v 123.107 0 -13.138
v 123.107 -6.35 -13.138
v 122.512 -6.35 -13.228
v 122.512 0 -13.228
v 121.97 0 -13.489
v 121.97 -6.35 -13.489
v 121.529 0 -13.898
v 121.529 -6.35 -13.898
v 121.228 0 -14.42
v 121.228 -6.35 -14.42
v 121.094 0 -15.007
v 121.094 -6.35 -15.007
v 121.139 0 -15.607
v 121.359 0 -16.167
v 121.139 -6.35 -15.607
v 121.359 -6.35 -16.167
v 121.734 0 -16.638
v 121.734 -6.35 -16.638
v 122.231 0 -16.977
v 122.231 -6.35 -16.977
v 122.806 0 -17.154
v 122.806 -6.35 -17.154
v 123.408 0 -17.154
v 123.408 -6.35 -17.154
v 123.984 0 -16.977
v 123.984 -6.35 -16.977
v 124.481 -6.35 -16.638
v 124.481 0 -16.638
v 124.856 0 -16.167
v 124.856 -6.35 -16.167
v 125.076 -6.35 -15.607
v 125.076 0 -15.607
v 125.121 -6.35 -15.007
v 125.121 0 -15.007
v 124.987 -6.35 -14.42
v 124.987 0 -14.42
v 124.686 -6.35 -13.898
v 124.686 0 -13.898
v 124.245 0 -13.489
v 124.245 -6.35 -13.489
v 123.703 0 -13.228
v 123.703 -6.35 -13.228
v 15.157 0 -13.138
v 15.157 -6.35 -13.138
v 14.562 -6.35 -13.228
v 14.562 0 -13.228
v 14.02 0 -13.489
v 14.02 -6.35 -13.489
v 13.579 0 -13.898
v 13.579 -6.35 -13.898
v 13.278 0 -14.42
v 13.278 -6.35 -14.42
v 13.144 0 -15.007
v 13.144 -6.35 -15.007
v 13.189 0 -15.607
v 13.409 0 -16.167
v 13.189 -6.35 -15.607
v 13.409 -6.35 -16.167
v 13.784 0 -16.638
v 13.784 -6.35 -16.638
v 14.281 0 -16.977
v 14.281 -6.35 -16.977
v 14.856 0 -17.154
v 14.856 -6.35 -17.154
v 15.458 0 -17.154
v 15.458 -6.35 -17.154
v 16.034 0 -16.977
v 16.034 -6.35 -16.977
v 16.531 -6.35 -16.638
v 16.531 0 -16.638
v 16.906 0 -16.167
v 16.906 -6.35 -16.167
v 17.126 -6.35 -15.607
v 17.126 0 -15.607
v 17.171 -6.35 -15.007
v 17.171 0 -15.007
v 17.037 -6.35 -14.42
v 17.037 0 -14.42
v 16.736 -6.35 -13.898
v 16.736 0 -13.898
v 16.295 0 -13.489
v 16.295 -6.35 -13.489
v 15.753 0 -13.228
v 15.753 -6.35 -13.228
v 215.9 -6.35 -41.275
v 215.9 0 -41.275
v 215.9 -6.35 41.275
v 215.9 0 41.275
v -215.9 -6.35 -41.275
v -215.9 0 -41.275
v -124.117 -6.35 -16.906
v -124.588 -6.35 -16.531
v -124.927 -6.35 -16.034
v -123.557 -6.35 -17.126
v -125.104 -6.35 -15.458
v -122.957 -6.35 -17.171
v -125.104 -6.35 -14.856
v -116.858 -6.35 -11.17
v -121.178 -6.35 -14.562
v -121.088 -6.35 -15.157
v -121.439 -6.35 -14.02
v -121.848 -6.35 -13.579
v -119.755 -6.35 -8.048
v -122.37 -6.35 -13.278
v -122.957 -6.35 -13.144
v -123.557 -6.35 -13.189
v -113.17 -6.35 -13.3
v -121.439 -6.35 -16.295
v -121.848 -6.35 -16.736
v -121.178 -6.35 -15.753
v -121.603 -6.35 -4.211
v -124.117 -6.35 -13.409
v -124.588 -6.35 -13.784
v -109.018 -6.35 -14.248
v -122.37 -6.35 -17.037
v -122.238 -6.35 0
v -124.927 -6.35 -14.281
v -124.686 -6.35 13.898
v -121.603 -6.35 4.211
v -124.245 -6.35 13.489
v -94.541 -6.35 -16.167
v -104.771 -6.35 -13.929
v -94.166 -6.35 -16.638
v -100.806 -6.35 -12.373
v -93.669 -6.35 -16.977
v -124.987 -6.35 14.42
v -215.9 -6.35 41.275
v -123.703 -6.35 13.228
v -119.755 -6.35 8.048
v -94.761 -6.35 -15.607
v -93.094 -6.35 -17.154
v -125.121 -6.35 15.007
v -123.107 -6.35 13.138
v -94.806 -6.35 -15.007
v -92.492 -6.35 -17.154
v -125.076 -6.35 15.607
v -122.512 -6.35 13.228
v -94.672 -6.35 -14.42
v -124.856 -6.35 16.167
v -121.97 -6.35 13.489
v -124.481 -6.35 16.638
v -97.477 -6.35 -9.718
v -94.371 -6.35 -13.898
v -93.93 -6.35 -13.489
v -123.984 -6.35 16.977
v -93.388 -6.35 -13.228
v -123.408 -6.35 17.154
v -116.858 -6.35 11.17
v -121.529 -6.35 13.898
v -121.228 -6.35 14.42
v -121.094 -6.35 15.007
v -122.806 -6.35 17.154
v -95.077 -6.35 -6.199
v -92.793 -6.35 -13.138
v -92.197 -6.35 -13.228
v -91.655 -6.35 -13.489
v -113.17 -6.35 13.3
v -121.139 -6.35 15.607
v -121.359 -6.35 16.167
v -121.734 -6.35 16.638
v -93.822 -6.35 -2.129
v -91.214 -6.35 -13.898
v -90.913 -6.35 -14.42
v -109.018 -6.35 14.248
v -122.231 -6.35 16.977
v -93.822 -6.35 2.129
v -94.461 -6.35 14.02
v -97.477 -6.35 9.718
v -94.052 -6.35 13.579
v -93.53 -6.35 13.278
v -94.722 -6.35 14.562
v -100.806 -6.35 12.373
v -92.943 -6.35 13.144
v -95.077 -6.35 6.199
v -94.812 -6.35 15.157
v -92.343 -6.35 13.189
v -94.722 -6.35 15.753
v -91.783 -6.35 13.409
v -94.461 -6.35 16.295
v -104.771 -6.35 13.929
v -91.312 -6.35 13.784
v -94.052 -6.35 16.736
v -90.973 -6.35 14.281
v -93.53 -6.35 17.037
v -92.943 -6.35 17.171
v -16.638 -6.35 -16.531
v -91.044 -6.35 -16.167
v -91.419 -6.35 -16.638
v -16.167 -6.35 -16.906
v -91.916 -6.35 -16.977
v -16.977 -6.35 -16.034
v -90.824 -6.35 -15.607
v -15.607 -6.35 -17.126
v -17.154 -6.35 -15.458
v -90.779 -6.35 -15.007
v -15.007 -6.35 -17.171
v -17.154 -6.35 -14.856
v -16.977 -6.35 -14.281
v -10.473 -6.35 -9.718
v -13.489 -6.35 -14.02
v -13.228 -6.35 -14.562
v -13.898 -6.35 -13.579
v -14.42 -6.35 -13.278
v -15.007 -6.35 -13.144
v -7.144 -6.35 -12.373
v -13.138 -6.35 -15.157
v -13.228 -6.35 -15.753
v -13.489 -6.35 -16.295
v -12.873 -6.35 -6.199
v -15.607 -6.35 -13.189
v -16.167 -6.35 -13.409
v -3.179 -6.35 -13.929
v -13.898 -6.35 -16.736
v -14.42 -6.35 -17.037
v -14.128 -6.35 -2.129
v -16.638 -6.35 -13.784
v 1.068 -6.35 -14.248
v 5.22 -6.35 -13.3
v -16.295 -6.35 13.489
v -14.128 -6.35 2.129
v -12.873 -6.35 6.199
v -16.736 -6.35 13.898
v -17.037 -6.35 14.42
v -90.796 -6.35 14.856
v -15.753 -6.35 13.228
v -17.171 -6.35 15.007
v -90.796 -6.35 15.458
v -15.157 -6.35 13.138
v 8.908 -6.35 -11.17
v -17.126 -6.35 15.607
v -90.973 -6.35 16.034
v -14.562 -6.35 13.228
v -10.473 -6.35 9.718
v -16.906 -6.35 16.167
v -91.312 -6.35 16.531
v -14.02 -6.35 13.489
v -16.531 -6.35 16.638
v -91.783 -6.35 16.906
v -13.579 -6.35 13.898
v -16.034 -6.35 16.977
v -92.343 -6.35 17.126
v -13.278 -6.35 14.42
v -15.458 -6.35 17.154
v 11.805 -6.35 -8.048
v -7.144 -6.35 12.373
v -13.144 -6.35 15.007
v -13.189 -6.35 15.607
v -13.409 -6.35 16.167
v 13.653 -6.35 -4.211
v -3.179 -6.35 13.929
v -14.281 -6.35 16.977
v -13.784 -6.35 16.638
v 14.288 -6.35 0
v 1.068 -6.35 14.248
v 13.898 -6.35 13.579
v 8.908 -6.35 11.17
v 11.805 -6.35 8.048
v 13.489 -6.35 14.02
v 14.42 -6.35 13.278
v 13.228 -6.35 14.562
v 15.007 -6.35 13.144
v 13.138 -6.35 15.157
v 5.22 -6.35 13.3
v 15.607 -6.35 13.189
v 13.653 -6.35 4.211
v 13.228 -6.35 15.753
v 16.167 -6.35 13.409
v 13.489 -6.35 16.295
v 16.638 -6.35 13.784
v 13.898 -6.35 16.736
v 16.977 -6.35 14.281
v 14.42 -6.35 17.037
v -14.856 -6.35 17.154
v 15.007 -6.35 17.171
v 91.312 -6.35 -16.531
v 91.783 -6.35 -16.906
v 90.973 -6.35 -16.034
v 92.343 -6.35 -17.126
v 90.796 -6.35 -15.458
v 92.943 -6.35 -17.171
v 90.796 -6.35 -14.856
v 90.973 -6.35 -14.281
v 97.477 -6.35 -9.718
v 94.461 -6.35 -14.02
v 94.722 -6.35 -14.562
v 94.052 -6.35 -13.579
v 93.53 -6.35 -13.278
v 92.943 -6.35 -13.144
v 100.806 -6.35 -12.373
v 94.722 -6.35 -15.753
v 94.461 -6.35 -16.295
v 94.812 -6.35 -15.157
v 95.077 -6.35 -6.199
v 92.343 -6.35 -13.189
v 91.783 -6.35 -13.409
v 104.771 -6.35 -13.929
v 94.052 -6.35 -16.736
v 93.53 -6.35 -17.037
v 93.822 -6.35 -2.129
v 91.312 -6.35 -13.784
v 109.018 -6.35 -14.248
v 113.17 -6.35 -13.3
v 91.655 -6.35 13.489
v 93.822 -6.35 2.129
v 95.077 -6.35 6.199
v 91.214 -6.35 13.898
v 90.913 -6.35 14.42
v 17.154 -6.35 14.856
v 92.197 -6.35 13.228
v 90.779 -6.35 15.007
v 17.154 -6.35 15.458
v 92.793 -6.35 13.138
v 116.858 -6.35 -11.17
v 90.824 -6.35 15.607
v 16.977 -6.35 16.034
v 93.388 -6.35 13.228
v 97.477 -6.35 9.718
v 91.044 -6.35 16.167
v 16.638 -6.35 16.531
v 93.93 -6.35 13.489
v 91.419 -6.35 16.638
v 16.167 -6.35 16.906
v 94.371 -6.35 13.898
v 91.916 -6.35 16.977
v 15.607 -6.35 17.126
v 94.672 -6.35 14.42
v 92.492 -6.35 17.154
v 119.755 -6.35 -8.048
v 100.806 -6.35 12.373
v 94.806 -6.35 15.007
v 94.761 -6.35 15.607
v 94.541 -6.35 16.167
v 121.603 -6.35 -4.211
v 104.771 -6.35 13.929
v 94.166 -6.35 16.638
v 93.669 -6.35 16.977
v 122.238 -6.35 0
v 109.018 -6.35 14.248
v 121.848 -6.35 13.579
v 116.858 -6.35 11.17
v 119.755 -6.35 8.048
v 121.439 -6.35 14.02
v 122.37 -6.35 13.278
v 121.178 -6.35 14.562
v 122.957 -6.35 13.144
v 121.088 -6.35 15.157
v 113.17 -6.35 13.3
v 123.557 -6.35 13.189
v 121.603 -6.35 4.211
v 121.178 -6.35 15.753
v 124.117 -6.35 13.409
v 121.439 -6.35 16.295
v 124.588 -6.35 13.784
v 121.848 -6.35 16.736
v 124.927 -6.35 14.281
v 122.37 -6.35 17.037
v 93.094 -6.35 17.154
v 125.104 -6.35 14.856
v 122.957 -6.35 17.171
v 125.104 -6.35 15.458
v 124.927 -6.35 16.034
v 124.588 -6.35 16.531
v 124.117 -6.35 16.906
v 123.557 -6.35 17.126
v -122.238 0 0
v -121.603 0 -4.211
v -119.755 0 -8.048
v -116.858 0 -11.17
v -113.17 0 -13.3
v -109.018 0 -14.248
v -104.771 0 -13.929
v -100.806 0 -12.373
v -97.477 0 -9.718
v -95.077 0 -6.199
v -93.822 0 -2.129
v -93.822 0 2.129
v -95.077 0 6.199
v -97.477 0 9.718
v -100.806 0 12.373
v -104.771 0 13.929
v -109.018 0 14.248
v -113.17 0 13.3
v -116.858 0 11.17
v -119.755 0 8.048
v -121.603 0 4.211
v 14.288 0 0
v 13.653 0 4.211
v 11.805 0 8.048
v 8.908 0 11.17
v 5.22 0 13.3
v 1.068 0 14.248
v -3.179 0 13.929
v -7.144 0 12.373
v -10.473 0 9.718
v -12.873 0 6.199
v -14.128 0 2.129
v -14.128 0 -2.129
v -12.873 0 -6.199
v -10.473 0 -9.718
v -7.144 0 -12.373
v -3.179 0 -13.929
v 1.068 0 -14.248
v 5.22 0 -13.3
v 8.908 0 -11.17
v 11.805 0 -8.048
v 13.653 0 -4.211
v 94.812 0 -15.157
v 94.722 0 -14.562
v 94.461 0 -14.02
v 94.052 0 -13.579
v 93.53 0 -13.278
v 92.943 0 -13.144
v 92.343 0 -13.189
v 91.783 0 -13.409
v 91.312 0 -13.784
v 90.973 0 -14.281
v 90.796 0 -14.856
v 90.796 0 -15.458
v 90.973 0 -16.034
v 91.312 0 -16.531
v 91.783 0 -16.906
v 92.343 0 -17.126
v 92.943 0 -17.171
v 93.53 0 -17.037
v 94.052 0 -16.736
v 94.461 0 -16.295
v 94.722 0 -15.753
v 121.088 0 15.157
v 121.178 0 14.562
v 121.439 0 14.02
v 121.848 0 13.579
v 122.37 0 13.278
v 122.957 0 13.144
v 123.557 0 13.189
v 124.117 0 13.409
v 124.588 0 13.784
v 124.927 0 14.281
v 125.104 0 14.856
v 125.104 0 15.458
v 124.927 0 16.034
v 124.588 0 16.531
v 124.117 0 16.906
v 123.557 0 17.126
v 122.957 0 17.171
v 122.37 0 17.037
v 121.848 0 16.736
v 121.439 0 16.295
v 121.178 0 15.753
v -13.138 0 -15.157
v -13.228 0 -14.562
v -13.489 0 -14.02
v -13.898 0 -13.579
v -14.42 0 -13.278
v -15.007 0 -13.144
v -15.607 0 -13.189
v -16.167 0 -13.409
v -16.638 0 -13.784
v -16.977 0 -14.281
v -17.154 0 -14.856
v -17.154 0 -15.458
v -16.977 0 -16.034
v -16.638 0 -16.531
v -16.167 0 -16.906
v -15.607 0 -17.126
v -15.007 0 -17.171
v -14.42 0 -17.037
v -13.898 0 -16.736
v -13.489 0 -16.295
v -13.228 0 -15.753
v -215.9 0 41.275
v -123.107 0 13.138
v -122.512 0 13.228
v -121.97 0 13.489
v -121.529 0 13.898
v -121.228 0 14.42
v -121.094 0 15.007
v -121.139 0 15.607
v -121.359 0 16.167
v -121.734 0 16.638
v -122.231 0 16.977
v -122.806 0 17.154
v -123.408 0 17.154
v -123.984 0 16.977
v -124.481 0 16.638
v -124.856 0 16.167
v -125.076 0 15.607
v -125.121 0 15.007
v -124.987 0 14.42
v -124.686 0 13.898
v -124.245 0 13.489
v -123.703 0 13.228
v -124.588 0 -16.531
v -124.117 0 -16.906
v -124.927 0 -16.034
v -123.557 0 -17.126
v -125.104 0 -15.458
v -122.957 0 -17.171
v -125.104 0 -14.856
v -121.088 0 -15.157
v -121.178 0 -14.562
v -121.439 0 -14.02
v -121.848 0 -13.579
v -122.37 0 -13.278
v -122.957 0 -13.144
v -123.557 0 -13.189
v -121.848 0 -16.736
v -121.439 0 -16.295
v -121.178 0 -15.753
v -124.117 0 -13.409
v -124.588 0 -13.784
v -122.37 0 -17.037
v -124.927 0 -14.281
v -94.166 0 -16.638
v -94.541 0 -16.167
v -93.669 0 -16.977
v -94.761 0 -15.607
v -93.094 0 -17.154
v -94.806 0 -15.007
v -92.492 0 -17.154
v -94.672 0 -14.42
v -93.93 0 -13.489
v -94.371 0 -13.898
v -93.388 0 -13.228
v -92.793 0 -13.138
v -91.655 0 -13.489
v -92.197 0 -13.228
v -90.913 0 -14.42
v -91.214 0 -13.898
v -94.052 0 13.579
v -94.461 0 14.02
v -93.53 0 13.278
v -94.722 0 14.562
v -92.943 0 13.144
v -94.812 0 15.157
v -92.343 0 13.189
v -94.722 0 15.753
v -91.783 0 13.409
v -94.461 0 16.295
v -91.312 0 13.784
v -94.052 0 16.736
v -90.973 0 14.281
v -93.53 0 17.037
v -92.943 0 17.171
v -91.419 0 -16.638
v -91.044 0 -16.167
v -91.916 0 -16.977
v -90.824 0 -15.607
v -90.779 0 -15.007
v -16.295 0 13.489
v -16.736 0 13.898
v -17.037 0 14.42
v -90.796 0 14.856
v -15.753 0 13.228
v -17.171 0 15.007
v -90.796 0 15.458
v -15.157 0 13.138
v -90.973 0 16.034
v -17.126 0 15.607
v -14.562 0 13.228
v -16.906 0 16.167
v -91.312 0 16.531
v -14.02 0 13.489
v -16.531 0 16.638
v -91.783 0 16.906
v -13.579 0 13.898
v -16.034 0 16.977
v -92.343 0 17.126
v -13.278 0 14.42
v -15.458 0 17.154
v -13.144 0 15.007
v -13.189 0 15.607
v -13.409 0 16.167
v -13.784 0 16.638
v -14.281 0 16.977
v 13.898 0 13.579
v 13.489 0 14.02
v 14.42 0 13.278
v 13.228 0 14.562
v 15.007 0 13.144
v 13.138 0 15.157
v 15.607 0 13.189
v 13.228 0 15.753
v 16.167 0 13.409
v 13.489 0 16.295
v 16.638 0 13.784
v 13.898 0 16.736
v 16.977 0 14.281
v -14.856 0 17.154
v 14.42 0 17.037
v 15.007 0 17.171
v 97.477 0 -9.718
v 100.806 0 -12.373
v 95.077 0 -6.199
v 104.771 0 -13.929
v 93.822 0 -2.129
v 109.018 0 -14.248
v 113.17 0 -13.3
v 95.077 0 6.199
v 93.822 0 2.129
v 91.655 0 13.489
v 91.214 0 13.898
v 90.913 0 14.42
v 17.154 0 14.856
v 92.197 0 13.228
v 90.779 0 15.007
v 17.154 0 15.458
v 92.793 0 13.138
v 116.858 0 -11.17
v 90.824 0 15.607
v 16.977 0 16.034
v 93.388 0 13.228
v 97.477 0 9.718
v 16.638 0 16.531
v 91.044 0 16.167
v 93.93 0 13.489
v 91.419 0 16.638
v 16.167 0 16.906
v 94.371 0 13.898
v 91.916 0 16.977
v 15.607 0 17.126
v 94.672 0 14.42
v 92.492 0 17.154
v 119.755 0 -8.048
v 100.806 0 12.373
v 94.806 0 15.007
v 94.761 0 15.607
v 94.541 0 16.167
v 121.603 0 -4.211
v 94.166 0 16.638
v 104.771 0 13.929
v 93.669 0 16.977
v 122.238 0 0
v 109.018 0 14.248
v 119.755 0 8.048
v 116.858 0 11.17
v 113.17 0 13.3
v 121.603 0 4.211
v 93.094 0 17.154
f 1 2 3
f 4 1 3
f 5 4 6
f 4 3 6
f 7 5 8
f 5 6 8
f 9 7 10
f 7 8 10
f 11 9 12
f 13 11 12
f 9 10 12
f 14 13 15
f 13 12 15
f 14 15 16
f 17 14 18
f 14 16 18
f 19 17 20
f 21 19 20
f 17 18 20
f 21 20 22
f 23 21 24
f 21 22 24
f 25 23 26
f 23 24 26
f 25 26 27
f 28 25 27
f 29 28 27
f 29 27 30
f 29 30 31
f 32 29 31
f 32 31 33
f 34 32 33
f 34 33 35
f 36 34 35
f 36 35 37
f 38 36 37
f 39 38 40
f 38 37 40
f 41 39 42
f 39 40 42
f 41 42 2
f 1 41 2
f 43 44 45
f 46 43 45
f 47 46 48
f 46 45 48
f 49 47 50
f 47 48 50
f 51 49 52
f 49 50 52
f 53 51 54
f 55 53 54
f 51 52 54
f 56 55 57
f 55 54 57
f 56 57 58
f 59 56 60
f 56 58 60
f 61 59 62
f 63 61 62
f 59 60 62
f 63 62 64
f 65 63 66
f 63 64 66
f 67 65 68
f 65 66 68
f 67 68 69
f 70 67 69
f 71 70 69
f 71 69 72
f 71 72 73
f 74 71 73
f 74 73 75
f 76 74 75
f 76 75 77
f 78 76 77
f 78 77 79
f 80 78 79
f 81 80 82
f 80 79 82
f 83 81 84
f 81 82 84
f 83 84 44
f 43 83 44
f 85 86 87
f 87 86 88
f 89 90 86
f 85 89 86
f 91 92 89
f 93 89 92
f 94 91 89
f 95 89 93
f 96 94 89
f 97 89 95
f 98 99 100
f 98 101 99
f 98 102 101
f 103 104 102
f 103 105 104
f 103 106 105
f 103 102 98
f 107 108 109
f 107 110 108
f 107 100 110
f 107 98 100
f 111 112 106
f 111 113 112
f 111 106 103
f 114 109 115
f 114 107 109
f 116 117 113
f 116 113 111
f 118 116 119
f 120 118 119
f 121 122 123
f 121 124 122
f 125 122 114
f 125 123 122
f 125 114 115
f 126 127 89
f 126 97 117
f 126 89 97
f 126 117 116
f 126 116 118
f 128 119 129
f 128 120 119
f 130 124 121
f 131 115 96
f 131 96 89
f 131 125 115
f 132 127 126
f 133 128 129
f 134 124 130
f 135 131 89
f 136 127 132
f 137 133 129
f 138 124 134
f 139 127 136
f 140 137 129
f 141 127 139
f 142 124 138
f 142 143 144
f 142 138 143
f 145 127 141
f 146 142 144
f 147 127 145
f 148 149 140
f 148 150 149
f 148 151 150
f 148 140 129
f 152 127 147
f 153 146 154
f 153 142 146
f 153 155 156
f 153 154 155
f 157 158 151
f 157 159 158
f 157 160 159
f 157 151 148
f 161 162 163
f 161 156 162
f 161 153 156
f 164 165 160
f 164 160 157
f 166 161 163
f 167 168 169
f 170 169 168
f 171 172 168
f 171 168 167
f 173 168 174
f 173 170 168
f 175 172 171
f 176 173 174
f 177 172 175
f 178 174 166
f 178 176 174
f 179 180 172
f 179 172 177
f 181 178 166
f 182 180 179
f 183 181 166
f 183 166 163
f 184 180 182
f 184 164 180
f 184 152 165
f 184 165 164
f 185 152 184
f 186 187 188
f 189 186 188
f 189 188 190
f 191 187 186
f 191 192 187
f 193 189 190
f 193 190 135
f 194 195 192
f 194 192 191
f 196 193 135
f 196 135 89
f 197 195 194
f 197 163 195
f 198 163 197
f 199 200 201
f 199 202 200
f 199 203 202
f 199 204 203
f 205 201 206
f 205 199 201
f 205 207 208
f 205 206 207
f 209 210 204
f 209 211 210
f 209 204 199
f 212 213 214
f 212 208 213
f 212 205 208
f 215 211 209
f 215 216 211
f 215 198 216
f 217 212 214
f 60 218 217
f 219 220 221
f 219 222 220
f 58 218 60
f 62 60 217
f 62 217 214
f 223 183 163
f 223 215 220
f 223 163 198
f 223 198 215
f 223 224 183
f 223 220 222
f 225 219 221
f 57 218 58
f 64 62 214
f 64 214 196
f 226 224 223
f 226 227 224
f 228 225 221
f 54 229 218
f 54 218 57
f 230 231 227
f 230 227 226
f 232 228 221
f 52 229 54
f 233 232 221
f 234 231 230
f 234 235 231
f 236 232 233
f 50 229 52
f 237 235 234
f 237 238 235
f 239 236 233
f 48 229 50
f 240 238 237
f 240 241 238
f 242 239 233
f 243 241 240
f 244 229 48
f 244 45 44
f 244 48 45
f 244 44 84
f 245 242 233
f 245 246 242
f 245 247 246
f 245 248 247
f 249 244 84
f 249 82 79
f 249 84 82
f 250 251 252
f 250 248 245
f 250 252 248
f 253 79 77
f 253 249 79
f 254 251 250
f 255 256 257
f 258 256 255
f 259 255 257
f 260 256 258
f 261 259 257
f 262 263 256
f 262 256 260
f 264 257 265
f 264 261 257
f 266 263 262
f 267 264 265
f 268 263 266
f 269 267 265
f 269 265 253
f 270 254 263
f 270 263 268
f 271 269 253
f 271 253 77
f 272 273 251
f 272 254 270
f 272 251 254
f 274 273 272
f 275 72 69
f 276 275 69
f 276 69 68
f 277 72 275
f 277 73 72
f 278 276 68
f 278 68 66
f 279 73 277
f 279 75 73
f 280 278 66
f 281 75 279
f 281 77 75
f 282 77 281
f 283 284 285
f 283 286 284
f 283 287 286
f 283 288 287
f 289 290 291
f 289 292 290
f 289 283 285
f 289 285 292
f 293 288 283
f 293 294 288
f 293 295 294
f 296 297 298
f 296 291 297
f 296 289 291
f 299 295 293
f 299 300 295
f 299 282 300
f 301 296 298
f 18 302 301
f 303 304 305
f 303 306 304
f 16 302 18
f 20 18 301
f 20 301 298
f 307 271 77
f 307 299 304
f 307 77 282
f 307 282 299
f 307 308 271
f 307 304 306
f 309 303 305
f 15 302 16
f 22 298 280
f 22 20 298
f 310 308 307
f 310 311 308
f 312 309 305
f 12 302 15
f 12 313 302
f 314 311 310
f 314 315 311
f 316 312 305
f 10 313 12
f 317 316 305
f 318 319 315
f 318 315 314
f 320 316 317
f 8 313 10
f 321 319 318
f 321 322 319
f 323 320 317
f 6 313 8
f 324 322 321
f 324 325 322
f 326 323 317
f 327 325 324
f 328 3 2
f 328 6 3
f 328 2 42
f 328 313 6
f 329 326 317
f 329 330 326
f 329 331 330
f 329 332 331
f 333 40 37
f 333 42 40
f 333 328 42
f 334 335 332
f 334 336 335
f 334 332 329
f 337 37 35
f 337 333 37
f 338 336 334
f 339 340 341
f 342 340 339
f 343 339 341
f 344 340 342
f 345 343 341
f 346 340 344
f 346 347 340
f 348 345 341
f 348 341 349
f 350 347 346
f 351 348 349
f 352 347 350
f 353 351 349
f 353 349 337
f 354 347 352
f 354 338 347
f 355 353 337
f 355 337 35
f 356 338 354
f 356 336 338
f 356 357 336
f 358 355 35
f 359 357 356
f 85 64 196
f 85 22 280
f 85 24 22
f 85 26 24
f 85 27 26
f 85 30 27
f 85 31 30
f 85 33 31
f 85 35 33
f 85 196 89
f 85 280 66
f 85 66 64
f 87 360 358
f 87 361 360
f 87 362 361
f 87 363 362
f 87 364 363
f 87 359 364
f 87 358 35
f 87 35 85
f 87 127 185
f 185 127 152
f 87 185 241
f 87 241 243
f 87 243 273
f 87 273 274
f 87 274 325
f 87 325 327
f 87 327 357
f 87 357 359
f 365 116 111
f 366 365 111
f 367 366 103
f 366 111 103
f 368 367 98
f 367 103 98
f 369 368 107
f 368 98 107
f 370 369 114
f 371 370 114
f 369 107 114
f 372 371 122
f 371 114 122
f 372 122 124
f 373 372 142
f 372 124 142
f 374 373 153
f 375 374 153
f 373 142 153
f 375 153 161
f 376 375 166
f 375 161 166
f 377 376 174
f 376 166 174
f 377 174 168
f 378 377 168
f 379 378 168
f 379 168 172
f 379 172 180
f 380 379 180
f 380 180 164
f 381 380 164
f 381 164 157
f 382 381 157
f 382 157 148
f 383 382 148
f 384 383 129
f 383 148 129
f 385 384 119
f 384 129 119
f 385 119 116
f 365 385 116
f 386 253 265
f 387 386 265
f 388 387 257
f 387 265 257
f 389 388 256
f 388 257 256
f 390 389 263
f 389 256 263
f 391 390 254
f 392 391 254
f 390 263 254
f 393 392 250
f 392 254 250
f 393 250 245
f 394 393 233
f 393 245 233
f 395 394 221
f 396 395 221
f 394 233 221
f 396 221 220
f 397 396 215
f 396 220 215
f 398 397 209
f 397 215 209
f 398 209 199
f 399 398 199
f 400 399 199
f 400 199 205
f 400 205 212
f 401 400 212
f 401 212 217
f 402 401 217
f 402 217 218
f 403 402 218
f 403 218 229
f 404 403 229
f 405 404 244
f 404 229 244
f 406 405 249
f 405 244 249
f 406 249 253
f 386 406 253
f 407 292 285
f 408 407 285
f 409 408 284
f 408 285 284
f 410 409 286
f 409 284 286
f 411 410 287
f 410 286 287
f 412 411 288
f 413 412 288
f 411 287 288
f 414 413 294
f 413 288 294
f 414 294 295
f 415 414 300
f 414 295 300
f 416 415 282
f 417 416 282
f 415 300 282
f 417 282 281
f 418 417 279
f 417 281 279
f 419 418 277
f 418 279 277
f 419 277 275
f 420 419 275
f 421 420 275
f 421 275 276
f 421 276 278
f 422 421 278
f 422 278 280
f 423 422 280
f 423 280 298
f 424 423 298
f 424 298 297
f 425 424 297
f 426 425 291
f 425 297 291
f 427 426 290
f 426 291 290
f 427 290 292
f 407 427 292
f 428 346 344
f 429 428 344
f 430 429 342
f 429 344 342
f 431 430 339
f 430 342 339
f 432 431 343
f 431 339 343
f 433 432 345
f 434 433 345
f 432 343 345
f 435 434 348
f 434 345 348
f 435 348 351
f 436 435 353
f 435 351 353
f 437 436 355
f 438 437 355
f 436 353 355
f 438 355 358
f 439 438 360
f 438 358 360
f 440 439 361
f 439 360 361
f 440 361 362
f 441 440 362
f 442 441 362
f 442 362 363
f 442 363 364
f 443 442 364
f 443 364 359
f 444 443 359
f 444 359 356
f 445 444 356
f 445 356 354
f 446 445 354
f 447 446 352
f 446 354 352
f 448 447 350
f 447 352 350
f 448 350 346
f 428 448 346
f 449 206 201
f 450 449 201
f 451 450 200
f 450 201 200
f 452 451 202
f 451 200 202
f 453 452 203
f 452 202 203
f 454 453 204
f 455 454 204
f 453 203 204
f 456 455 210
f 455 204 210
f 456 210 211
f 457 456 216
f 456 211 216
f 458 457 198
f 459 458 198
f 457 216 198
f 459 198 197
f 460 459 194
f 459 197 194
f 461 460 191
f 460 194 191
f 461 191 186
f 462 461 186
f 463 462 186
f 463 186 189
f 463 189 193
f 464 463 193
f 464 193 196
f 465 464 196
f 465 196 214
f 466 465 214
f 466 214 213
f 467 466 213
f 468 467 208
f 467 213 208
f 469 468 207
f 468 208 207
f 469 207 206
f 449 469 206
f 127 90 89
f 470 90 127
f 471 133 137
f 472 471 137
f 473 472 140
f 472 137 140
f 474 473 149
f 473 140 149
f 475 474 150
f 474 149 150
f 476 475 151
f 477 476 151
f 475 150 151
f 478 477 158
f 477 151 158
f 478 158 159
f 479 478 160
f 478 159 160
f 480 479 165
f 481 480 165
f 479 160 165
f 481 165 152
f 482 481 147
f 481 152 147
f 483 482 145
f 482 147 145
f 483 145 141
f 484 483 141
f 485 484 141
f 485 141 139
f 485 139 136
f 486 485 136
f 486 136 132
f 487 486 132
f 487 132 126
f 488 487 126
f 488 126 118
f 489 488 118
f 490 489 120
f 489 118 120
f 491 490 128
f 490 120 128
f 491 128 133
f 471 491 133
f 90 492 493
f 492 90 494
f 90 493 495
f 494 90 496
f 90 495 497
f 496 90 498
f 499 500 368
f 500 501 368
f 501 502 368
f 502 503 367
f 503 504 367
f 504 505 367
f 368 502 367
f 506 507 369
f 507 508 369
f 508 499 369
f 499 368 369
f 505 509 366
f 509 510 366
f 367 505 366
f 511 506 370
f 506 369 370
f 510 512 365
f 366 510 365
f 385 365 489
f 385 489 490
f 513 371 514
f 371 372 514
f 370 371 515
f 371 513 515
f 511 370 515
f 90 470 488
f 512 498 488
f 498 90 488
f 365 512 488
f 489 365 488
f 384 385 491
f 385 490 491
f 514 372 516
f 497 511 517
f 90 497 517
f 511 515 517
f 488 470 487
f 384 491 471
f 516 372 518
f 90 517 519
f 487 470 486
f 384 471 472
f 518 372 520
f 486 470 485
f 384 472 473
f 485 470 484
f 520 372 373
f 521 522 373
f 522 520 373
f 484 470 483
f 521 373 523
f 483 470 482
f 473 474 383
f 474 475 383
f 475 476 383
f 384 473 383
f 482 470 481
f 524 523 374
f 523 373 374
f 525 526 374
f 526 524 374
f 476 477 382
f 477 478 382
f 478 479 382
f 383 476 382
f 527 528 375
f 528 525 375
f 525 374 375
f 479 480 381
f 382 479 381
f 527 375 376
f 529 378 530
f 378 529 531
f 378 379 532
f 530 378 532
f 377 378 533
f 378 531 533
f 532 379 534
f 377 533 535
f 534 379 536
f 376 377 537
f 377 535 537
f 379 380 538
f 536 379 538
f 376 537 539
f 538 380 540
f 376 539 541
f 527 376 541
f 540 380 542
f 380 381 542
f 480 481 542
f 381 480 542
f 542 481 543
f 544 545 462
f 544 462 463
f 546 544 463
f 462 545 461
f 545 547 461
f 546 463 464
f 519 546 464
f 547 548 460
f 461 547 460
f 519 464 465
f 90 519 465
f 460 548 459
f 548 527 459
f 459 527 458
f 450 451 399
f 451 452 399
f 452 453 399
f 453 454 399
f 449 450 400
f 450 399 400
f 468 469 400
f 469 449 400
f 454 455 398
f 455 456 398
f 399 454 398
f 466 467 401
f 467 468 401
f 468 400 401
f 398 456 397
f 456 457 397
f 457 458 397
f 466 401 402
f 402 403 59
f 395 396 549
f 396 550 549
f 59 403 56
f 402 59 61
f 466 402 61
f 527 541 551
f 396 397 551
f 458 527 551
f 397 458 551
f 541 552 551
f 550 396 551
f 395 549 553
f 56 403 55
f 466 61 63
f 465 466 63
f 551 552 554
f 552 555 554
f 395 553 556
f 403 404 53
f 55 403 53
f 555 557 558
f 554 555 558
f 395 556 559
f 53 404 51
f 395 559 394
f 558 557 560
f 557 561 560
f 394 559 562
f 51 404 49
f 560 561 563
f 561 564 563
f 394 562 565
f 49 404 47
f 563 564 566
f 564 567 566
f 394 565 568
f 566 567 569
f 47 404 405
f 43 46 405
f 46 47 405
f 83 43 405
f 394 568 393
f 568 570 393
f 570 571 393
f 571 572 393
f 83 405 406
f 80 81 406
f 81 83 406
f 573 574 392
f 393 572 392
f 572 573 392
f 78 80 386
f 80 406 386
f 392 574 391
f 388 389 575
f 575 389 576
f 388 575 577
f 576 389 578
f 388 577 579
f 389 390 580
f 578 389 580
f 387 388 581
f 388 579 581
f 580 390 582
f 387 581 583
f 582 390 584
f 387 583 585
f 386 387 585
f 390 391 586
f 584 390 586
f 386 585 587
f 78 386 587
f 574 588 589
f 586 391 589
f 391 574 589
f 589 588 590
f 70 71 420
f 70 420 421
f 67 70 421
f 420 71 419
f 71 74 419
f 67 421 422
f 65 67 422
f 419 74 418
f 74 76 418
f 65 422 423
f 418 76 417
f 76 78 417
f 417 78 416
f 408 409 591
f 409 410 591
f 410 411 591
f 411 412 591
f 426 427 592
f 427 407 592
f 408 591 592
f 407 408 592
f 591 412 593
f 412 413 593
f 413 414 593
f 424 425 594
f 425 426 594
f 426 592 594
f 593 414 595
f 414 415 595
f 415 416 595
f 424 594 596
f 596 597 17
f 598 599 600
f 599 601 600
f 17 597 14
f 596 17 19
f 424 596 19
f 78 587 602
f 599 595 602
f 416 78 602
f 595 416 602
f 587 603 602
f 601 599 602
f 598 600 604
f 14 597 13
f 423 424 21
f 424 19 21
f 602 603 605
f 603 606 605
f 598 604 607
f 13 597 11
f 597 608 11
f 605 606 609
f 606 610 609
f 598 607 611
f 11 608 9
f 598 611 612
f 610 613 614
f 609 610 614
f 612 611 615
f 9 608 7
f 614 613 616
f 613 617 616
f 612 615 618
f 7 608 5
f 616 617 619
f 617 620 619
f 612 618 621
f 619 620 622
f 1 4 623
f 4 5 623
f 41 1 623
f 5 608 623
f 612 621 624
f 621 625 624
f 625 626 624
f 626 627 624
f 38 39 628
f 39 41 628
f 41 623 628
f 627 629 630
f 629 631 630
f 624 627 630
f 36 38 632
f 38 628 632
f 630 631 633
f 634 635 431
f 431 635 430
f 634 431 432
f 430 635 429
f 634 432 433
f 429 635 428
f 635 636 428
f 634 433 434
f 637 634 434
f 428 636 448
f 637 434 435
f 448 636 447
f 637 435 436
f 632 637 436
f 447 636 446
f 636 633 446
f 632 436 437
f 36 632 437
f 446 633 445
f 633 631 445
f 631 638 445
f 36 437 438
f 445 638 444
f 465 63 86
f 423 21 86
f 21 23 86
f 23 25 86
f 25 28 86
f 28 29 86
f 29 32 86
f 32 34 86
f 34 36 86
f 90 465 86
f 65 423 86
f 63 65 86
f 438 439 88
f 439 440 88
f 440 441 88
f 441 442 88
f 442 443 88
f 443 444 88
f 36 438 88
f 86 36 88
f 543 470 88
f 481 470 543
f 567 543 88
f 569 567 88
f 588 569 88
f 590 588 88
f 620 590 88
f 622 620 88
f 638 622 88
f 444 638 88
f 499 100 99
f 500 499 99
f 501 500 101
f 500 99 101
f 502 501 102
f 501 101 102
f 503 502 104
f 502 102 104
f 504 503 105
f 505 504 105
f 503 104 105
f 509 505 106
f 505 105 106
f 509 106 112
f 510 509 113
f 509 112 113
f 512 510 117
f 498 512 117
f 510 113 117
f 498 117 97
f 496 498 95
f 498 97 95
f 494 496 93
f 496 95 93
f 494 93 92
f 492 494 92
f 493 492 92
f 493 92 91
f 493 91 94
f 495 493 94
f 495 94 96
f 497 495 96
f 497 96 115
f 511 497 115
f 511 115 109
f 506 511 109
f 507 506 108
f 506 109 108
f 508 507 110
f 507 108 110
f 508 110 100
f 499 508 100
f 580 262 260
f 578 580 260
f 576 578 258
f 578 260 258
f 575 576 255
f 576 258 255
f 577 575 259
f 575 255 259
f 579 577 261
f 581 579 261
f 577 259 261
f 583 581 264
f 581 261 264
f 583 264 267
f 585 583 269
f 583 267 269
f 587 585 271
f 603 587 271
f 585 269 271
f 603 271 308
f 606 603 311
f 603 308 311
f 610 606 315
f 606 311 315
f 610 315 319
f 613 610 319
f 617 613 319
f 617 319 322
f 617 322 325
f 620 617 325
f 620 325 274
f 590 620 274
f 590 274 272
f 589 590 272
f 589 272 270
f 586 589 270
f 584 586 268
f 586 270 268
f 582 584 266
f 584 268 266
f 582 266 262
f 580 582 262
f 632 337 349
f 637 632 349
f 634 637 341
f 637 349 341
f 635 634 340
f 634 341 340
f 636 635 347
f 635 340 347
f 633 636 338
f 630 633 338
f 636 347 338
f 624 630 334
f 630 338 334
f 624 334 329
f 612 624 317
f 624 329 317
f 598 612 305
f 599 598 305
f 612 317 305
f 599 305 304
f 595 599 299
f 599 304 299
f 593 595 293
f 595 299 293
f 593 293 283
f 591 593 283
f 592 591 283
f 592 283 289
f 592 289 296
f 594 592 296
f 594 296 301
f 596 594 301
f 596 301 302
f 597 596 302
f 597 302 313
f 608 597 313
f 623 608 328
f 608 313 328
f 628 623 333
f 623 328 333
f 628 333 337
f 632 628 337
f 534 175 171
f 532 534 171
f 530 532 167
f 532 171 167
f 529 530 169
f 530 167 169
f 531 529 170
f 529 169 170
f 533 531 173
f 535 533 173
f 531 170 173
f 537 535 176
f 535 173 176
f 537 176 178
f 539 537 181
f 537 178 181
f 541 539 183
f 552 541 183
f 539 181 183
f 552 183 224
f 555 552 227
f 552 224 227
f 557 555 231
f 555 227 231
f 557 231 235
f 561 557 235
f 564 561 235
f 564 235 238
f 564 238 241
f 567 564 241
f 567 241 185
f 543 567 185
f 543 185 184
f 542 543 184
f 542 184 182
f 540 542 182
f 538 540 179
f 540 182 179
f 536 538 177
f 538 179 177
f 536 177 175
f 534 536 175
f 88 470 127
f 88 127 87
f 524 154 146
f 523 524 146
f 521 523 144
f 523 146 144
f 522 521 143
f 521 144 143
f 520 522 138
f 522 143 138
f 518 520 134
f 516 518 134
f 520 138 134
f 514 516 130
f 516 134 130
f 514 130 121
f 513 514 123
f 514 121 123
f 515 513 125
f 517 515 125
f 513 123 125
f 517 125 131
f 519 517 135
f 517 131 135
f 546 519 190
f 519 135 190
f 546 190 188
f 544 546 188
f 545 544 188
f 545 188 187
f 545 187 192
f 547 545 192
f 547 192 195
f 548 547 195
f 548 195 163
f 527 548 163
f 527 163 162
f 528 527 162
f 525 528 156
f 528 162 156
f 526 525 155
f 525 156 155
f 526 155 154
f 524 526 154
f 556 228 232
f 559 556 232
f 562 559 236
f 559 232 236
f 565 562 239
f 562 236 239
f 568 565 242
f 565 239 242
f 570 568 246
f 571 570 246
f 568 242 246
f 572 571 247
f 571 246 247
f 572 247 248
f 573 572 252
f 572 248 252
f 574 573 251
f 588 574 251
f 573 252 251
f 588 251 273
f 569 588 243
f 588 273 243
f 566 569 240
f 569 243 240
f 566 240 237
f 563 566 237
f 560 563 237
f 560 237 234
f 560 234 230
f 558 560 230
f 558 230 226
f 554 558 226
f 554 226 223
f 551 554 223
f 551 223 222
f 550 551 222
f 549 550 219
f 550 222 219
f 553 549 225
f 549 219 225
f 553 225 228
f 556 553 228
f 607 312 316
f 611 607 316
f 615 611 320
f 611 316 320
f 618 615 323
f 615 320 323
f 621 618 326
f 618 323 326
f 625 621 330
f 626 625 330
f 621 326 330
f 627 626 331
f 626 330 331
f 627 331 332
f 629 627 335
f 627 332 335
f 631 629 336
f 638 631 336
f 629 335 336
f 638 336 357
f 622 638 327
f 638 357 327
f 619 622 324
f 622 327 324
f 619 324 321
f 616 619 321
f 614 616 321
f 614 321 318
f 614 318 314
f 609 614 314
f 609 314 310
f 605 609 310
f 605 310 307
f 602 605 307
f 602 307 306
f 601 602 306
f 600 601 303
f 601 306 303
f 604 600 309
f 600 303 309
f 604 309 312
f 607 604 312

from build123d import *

# Parameters (mm, degrees)
F0_W     = 431.8
F0_H     = 82.55
F1_DEPTH = 6.35
F3_DEPTH = 6.35
F5_DEPTH = 6.35


with BuildPart() as f1:
    # F0 (on Front) → F1 (new body)
    with BuildSketch(Plane.XZ):
        Rectangle(F0_W, F0_H)
    extrude(amount=F1_DEPTH)

    # F2 (on face) → F3 (cut, through all)
    with BuildSketch(Plane.XZ.offset(6.35)):
        with BuildLine():
            Line((-122.2375, 0), (-93.6625, 0))
            ThreePointArc((-93.6625, 0), (-107.95, 14.2875), (-122.2375, 0))
        make_face()
        with BuildLine():
            ThreePointArc((-122.2375, 0), (-107.95, -14.2875), (-93.6625, 0))
            Line((-93.6625, 0), (-122.2375, 0))
        make_face()
        with BuildLine():
            ThreePointArc((-14.2875, 0), (0, -14.2875), (14.2875, 0))
            Line((14.2875, 0), (-14.2875, 0))
        make_face()
        with BuildLine():
            Line((-14.2875, 0), (14.2875, 0))
            ThreePointArc((14.2875, 0), (0, 14.2875), (-14.2875, 0))
        make_face()
        with BuildLine():
            ThreePointArc((93.6625, 0), (107.95, -14.2875), (122.2375, 0))
            Line((122.2375, 0), (93.6625, 0))
        make_face()
        with BuildLine():
            Line((93.6625, 0), (122.2375, 0))
            ThreePointArc((122.2375, 0), (107.95, 14.2875), (93.6625, 0))
        make_face()
    extrude(amount=-F3_DEPTH, mode=Mode.SUBTRACT)

    # F4 (on face) → F5 (cut, through all)
    with BuildSketch(Plane.XZ.offset(6.35)):
        with BuildLine():
            ThreePointArc((-90.77325, -15.15745), (-91.3646892767, -13.7295892768), (-92.79255, -13.13815))
            Line((-92.79255, -13.13815), (-92.79255, -15.15745))
            Line((-92.79255, -15.15745), (-94.81185, -15.15745))
            ThreePointArc((-94.81185, -15.15745), (-92.79255, -17.17675), (-90.77325, -15.15745))
        make_face()
        with BuildLine():
            Line((-92.79255, -15.15745), (-92.79255, -13.13815))
            ThreePointArc((-92.79255, -13.13815), (-94.2204107232, -13.7295892767), (-94.81185, -15.15745))
            Line((-94.81185, -15.15745), (-92.79255, -15.15745))
        make_face()
        with BuildLine():
            ThreePointArc((-90.77325, 15.15745), (-92.79255, 17.17675), (-94.81185, 15.15745))
            Line((-94.81185, 15.15745), (-92.79255, 15.15745))
            Line((-92.79255, 15.15745), (-92.79255, 13.13815))
            ThreePointArc((-92.79255, 13.13815), (-91.3646892767, 13.7295892768), (-90.77325, 15.15745))
        make_face()
        with BuildLine():
            Line((-92.79255, 15.15745), (-94.81185, 15.15745))
            ThreePointArc((-94.81185, 15.15745), (-94.2204107232, 13.7295892767), (-92.79255, 13.13815))
            Line((-92.79255, 13.13815), (-92.79255, 15.15745))
        make_face()
        with BuildLine():
            ThreePointArc((-123.10745, -13.13815), (-124.5353107233, -16.5853107232), (-121.08815, -15.15745))
            Line((-121.08815, -15.15745), (-123.10745, -15.15745))
            Line((-123.10745, -15.15745), (-123.10745, -13.13815))
        make_face()
        with BuildLine():
            Line((-123.10745, -15.15745), (-121.08815, -15.15745))
            ThreePointArc((-121.08815, -15.15745), (-121.6795892767, -13.7295892768), (-123.10745, -13.13815))
            Line((-123.10745, -13.13815), (-123.10745, -15.15745))
        make_face()
        with BuildLine():
            ThreePointArc((-121.08815, 15.15745), (-124.5353107233, 16.5853107232), (-123.10745, 13.13815))
            ThreePointArc((-123.10745, 13.13815), (-121.6795892767, 13.7295892768), (-121.08815, 15.15745))
        make_face()
        with BuildLine():
            ThreePointArc((125.12675, -15.15745), (124.5353107233, -13.7295892768), (123.10745, -13.13815))
            Line((123.10745, -13.13815), (123.10745, -15.15745))
            Line((123.10745, -15.15745), (121.08815, -15.15745))
            ThreePointArc((121.08815, -15.15745), (123.10745, -17.17675), (125.12675, -15.15745))
        make_face()
        with BuildLine():
            Line((123.10745, -15.15745), (123.10745, -13.13815))
            ThreePointArc((123.10745, -13.13815), (121.6795892768, -13.7295892767), (121.08815, -15.15745))
            Line((121.08815, -15.15745), (123.10745, -15.15745))
        make_face()
        with BuildLine():
            ThreePointArc((125.12675, 15.15745), (123.10745, 17.17675), (121.08815, 15.15745))
            Line((121.08815, 15.15745), (123.10745, 15.15745))
            Line((123.10745, 15.15745), (123.10745, 13.13815))
            ThreePointArc((123.10745, 13.13815), (124.5353107233, 13.7295892768), (125.12675, 15.15745))
        make_face()
        with BuildLine():
            Line((123.10745, 15.15745), (121.08815, 15.15745))
            ThreePointArc((121.08815, 15.15745), (121.6795892768, 13.7295892767), (123.10745, 13.13815))
            Line((123.10745, 13.13815), (123.10745, 15.15745))
        make_face()
        with BuildLine():
            ThreePointArc((94.81185, 15.15745), (91.3646892767, 16.5853107232), (92.79255, 13.13815))
            ThreePointArc((92.79255, 13.13815), (94.2204107233, 13.7295892768), (94.81185, 15.15745))
        make_face()
        with BuildLine():
            ThreePointArc((92.79255, -13.13815), (91.3646892767, -16.5853107232), (94.81185, -15.15745))
            Line((94.81185, -15.15745), (92.79255, -15.15745))
            Line((92.79255, -15.15745), (92.79255, -13.13815))
        make_face()
        with BuildLine():
            Line((92.79255, -15.15745), (94.81185, -15.15745))
            ThreePointArc((94.81185, -15.15745), (94.2204107233, -13.7295892768), (92.79255, -13.13815))
            Line((92.79255, -13.13815), (92.79255, -15.15745))
        make_face()
        with BuildLine():
            ThreePointArc((-15.15745, -13.13815), (-16.5853107233, -16.5853107232), (-13.13815, -15.15745))
            Line((-13.13815, -15.15745), (-15.15745, -15.15745))
            Line((-15.15745, -15.15745), (-15.15745, -13.13815))
        make_face()
        with BuildLine():
            Line((-15.15745, -15.15745), (-13.13815, -15.15745))
            ThreePointArc((-13.13815, -15.15745), (-13.7295892767, -13.7295892768), (-15.15745, -13.13815))
            Line((-15.15745, -13.13815), (-15.15745, -15.15745))
        make_face()
        with BuildLine():
            ThreePointArc((17.17675, -15.15745), (16.5853107233, -13.7295892768), (15.15745, -13.13815))
            Line((15.15745, -13.13815), (15.15745, -15.15745))
            Line((15.15745, -15.15745), (13.13815, -15.15745))
            ThreePointArc((13.13815, -15.15745), (15.15745, -17.17675), (17.17675, -15.15745))
        make_face()
        with BuildLine():
            Line((15.15745, -15.15745), (15.15745, -13.13815))
            ThreePointArc((15.15745, -13.13815), (13.7295892768, -13.7295892767), (13.13815, -15.15745))
            Line((13.13815, -15.15745), (15.15745, -15.15745))
        make_face()
        with BuildLine():
            ThreePointArc((17.17675, 15.15745), (15.15745, 17.17675), (13.13815, 15.15745))
            Line((13.13815, 15.15745), (15.15745, 15.15745))
            Line((15.15745, 15.15745), (15.15745, 13.13815))
            ThreePointArc((15.15745, 13.13815), (16.5853107233, 13.7295892768), (17.17675, 15.15745))
        make_face()
        with BuildLine():
            Line((15.15745, 15.15745), (13.13815, 15.15745))
            ThreePointArc((13.13815, 15.15745), (13.7295892768, 13.7295892767), (15.15745, 13.13815))
            Line((15.15745, 13.13815), (15.15745, 15.15745))
        make_face()
        with BuildLine():
            ThreePointArc((-13.13815, 15.15745), (-16.5853107233, 16.5853107232), (-15.15745, 13.13815))
            ThreePointArc((-15.15745, 13.13815), (-13.7295892767, 13.7295892768), (-13.13815, 15.15745))
        make_face()
    extrude(amount=-F5_DEPTH, mode=Mode.SUBTRACT)


solid = f1.part
